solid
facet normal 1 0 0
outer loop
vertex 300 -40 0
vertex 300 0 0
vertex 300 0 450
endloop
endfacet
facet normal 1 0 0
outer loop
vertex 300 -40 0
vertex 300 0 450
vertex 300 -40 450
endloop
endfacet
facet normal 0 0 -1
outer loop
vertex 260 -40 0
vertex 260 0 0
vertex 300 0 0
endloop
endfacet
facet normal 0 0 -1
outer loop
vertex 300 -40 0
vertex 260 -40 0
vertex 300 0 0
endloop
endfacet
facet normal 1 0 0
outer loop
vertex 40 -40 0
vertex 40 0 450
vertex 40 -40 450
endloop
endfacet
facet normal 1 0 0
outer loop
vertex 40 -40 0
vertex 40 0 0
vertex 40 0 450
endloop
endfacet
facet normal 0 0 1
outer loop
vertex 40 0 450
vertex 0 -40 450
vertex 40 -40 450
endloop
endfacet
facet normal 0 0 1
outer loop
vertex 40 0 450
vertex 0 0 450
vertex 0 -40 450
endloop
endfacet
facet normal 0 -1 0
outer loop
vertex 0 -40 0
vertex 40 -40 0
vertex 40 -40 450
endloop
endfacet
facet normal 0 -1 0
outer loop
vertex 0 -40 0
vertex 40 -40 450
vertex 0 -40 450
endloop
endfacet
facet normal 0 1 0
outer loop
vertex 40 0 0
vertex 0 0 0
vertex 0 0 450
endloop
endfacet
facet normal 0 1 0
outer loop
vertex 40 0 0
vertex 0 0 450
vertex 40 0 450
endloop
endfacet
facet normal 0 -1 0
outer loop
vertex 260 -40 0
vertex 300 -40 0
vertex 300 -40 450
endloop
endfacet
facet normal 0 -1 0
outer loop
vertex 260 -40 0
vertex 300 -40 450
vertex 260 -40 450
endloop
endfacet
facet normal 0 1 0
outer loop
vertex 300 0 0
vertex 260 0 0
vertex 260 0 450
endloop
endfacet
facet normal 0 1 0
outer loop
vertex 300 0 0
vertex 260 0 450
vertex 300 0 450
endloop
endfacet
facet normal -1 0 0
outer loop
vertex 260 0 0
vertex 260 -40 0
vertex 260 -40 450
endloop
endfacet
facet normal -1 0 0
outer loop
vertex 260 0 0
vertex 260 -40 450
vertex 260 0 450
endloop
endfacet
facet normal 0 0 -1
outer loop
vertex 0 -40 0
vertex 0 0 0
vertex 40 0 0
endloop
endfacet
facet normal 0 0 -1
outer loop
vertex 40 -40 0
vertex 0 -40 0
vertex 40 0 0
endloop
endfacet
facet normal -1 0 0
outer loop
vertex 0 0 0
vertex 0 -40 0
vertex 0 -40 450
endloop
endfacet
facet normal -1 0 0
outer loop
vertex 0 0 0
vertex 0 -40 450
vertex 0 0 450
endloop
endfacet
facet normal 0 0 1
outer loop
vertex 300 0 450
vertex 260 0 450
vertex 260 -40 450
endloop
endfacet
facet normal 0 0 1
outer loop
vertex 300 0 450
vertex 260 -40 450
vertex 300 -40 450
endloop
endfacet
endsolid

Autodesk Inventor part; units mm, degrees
ref_plane "YZ Plane" through (0, 0, 0) normal (1, 0, 0) x (0, 1, 0)
ref_plane "XZ Plane" through (0, 0, 0) normal (0, 1, 0) x (-1, 0, 0)
ref_plane "XY Plane" through (0, 0, 0) normal (0, 0, 1) x (1, 0, 0)
sketch "Sketch1" plane through (0, 0, 0) normal (0, 0, 1) x (1, 0, 0)
  line L0 (0, 0) -> (40, 0)
  line L1 (40, 0) -> (40, -40)
  line L2 (40, -40) -> (0, -40)
  line L3 (0, -40) -> (0, 0)
  line L4 (260, 0) -> (300, 0)
  line L5 (300, 0) -> (300, -40)
  line L6 (300, -40) -> (260, -40)
  line L7 (260, -40) -> (260, 0)
  dimension "d0" = 40
  dimension "d1" = 40
  dimension "d2" = 260
extrude "Extrusion1" add sketch "Sketch1" along normal blind 450 contours L0 L1 L2 L3
extrude "Extrusion2" add sketch "Sketch1" along normal up to surface (450 mm away) separate body contours L4 L5 L6 L7
ref_plane "Work Plane1" through (0, 0, 225) normal (0, 0, 1) x (1, 0, 0)
ref_plane "Work Plane2" through (150, -40, 0) normal (1, 0, 0) x (0, 0, -1)
ref_plane "Work Plane3" through (0, -20, 0) normal (0, 1, 0) x (1, 0, 0)
properties part number "Assembly Mount Rack"
